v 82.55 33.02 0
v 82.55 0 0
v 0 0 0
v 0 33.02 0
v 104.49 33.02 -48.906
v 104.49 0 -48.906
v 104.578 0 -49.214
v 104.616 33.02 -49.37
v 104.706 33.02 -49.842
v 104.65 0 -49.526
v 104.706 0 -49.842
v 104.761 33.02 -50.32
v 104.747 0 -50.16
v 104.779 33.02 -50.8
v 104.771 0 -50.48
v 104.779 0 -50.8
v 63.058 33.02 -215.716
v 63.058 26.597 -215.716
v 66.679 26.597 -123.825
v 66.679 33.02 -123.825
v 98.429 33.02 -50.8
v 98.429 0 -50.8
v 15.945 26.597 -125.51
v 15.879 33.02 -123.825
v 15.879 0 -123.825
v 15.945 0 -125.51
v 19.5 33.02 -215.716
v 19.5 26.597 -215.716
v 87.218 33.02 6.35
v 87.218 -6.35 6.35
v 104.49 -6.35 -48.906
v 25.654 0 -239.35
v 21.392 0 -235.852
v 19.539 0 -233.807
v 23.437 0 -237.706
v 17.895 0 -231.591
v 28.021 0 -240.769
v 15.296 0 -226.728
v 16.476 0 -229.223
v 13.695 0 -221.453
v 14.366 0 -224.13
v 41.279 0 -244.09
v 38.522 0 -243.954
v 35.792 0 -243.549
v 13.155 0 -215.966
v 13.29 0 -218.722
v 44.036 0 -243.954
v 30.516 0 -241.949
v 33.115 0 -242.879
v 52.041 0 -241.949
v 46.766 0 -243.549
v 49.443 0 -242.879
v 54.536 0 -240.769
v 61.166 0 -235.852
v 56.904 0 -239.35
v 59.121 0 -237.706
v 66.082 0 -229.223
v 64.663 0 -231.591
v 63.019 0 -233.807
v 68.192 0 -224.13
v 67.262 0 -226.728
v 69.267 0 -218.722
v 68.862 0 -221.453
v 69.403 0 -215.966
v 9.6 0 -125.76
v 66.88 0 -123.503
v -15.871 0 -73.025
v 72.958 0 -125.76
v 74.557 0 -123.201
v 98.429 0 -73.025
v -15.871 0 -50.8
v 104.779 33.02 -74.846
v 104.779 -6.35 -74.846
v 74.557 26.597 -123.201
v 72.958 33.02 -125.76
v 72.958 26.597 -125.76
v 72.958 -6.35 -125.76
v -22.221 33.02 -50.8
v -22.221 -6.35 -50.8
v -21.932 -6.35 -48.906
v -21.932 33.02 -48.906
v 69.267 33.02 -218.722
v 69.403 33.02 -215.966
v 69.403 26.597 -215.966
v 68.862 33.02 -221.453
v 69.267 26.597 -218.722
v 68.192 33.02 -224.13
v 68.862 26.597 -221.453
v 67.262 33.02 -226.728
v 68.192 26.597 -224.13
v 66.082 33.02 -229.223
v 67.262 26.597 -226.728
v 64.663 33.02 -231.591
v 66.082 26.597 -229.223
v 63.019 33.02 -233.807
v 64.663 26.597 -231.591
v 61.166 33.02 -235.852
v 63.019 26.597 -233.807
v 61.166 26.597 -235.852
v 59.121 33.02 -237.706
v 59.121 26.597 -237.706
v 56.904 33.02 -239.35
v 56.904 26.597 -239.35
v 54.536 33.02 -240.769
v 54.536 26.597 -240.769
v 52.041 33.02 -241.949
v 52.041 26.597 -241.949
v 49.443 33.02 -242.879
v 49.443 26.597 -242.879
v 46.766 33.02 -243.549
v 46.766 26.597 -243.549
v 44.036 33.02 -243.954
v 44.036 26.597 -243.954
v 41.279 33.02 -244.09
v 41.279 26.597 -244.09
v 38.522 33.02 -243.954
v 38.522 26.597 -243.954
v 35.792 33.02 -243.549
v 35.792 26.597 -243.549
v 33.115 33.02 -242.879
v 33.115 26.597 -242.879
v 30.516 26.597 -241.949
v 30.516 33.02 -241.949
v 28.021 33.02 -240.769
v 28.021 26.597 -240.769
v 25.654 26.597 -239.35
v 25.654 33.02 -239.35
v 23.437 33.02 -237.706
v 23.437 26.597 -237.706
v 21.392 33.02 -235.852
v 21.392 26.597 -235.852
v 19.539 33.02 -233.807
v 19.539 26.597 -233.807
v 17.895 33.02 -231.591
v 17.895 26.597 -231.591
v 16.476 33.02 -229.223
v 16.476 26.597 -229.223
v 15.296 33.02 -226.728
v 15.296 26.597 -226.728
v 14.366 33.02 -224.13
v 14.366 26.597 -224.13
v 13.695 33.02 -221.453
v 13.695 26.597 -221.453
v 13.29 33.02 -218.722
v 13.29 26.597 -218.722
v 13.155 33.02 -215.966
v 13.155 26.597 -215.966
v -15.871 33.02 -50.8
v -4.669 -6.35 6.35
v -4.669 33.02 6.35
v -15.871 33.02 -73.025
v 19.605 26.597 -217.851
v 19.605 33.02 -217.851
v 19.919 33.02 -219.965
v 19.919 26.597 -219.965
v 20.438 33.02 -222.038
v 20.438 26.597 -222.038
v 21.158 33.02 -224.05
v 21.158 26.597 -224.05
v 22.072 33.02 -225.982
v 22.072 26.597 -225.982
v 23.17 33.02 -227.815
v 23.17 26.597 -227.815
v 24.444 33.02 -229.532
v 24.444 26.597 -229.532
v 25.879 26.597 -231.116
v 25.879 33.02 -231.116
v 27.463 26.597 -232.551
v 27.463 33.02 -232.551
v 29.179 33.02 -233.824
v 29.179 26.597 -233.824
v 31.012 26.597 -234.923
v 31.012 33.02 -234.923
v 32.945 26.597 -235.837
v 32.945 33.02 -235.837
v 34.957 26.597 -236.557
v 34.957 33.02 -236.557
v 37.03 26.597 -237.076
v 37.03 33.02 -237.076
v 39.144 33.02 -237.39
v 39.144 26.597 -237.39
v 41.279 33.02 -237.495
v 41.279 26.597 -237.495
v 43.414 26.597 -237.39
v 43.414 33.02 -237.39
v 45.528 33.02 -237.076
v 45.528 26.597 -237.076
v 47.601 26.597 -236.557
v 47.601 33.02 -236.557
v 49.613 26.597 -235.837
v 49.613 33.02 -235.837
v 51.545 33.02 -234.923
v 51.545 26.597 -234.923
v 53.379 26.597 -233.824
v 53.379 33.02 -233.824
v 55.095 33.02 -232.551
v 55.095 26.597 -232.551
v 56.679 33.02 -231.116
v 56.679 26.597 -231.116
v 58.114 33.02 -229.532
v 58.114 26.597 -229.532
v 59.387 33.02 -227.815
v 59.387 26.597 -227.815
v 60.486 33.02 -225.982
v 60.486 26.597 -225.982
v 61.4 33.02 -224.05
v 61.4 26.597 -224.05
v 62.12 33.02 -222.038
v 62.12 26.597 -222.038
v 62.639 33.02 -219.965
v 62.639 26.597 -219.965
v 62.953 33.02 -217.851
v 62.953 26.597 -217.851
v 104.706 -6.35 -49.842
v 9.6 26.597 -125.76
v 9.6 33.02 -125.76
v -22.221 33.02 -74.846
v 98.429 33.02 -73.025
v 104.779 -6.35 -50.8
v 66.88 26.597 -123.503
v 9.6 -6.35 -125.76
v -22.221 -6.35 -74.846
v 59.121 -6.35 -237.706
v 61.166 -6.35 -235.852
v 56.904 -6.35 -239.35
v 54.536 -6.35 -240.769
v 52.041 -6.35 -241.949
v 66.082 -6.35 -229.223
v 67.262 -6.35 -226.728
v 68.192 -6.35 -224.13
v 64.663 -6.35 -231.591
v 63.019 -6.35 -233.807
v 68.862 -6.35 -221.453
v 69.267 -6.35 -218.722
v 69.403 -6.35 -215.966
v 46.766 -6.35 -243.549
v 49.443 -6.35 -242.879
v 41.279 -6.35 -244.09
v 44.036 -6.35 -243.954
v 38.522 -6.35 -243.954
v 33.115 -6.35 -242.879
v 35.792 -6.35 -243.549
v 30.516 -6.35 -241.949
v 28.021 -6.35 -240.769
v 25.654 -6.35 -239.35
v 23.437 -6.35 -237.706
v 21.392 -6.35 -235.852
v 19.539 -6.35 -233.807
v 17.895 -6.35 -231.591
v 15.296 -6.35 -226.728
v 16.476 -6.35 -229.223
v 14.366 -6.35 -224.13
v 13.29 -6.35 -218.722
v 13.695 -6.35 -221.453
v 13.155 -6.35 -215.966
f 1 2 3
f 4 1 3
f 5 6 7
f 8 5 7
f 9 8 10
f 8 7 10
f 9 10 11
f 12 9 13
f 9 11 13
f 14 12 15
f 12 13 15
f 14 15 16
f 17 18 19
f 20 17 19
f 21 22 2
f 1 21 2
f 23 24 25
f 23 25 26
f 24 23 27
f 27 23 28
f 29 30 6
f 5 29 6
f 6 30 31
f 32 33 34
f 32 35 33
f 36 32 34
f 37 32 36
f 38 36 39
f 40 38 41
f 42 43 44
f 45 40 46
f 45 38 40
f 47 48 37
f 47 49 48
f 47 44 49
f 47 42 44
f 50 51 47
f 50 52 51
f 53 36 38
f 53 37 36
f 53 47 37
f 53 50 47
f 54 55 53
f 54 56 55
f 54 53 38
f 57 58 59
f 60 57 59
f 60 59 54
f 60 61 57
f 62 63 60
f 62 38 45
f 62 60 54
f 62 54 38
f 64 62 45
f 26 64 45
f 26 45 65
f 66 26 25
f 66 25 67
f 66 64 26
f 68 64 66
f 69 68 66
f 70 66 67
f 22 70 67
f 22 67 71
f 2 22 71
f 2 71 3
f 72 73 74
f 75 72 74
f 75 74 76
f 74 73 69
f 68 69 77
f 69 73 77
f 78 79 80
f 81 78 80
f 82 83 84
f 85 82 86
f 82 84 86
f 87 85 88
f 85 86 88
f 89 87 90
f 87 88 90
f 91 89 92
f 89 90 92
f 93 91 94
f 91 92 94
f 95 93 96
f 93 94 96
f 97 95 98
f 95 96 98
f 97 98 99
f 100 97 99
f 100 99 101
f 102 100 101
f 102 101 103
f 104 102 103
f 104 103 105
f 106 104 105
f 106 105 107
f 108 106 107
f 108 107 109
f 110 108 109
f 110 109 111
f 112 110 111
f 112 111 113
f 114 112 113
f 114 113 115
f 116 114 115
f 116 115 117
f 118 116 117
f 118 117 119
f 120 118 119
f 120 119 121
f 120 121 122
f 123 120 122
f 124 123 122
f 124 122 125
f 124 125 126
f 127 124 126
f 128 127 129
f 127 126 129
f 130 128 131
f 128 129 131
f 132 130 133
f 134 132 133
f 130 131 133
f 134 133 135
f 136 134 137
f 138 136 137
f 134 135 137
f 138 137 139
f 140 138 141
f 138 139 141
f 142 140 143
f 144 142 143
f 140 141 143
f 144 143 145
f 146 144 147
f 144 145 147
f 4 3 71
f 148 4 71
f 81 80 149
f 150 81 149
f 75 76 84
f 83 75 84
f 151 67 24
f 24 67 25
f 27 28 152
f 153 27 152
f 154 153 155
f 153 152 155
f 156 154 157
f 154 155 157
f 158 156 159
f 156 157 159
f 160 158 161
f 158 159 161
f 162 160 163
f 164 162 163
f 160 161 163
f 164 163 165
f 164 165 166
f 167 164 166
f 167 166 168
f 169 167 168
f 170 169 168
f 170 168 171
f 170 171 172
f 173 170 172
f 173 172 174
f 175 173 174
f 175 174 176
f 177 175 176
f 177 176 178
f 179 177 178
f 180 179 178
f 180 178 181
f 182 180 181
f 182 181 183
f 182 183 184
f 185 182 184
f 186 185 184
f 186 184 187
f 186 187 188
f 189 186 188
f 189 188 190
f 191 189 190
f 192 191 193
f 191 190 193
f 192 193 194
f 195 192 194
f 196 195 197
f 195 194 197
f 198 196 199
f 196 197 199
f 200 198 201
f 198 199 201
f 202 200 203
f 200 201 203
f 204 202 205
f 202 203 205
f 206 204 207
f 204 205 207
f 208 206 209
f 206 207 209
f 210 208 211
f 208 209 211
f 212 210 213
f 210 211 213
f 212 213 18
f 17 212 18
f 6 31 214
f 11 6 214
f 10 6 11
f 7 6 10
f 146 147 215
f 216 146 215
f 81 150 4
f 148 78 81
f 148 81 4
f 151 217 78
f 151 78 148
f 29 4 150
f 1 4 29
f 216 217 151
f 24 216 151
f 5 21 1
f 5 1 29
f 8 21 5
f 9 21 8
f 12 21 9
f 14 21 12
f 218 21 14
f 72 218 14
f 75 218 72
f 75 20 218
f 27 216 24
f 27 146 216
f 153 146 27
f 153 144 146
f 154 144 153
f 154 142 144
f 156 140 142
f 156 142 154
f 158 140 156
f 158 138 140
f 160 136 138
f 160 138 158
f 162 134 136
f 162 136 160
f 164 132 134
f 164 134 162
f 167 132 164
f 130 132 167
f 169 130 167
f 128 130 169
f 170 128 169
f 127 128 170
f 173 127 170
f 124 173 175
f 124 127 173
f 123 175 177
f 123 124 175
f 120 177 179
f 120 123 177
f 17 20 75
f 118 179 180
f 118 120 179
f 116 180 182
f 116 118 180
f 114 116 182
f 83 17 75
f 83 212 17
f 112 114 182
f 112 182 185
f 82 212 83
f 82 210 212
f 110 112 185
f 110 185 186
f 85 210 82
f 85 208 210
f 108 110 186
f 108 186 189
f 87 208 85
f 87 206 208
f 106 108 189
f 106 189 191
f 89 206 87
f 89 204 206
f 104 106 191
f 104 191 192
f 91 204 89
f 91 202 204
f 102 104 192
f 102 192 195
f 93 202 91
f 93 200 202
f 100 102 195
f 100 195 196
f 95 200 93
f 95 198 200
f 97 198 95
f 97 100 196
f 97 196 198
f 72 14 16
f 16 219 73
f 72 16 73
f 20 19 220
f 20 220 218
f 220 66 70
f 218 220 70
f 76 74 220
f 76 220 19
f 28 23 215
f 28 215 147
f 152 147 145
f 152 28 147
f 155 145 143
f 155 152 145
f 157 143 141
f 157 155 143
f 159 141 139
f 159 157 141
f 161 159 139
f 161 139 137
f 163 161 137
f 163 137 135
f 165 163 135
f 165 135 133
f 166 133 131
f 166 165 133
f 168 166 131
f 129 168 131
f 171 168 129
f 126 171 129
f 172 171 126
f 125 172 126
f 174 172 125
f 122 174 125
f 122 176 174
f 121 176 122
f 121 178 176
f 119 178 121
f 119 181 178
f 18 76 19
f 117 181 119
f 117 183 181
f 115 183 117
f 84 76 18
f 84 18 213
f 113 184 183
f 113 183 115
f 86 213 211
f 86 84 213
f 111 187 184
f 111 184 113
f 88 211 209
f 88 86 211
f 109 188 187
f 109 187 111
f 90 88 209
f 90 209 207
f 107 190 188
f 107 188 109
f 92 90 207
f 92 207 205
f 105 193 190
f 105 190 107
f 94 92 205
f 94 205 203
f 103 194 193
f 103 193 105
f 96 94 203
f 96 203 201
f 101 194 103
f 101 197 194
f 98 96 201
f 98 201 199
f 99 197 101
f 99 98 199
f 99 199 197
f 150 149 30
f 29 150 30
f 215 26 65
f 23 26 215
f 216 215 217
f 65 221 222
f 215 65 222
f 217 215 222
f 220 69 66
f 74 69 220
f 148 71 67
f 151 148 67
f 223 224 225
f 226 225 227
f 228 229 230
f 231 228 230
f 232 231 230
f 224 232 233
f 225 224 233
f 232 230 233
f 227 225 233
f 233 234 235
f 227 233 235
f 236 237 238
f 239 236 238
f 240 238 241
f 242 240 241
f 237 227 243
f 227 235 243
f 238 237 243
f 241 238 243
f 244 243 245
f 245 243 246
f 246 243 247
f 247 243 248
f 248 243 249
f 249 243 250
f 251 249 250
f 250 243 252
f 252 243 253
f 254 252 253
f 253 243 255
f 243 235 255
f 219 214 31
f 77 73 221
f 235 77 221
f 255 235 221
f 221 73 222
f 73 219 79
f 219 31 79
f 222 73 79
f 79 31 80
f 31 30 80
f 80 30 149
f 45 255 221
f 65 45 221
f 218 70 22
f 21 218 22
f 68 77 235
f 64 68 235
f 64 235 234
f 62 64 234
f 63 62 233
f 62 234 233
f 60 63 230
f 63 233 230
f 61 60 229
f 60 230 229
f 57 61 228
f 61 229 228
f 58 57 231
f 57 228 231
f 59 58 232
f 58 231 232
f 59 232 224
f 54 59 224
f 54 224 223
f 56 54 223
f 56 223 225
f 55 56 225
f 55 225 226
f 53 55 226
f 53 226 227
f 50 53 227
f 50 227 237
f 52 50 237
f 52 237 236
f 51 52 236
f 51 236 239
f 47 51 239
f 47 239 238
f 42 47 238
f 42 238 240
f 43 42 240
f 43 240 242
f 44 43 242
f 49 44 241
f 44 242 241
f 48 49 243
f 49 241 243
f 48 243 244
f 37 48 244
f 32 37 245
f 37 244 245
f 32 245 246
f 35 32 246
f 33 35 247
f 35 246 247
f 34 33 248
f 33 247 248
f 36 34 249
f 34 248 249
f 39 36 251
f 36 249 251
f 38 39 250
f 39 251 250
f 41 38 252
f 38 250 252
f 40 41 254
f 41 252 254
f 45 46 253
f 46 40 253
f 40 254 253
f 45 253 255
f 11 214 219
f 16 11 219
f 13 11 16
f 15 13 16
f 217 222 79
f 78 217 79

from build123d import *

# Parameters (mm, degrees)
BOSS_EXTRUDE1_DEPTH     = 33.02
BOSS_EXTRUDE2_START     = 6.35
BOSS_EXTRUDE2_DEPTH     = 6.35
CUT_EXTRUDE1_DEPTH      = 96.52
CUT_EXTRUDE1_DEPTH_BACK = 96.52
SKETCH3_W               = 138.649472244
SKETCH3_H               = 26.596699


with BuildPart() as part:
    # Sketch1 → Boss-Extrude1 (new body)
    with BuildSketch(Plane(origin=(0, 0, 0), x_dir=(1, 0, 0), z_dir=(0, 1, 0))):
        with BuildLine():
            Line((-22.221083262, 74.846156038), (-22.221083262, 50.8))
            Line((-22.221083262, 50.8), (-21.932164151, 48.906379538))
            Line((-21.932164151, 48.906379538), (-4.668805876, -6.35))
            Line((-4.668805876, -6.35), (87.218118757, -6.35))
            Line((87.218118757, -6.35), (104.489731546, 48.905528077))
            ThreePointArc((104.489731546, 48.905528077), (104.706204131, 49.841791784), (104.778916738, 50.8))
            Line((104.778916738, 50.8), (104.778916738, 74.846156038))
            Line((104.778916738, 74.846156038), (72.957581245, 125.760292827))
            Line((72.957581245, 125.760292827), (69.402851201, 215.965853579))
            ThreePointArc((69.402851201, 215.965853579), (41.278916738, 244.089788041), (13.154982275, 215.965853579))
            Line((13.154982275, 215.965853579), (9.600252232, 125.760292827))
            Line((9.600252232, 125.760292827), (-22.221083262, 74.846156038))
        make_face()
        with BuildLine():
            Line((82.55, 0), (0, 0))
            Line((0, 0), (-15.871083262, 50.8))
            Line((-15.871083262, 50.8), (-15.871083262, 73.025))
            Line((-15.871083262, 73.025), (15.878916738, 123.825))
            Line((15.878916738, 123.825), (19.500057517, 215.715813233))
            ThreePointArc((19.500057517, 215.715813233), (41.278916738, 237.494672454), (63.057775959, 215.715813233))
            Line((63.057775959, 215.715813233), (66.678916738, 123.825))
            Line((66.678916738, 123.825), (98.428916738, 73.025))
            Line((98.428916738, 73.025), (98.428916738, 50.8))
            Line((98.428916738, 50.8), (82.55, 0))
        make_face(mode=Mode.SUBTRACT)
    extrude(amount=BOSS_EXTRUDE1_DEPTH)

    # Sketch2 → Boss-Extrude2 (add)
    with BuildSketch(Plane.XZ.offset(BOSS_EXTRUDE2_START)):
        with BuildLine():
            Line((87.218118757, 6.35), (-4.668805876, 6.35))
            Line((-4.668805876, 6.35), (-21.932164151, -48.906379538))
            Line((-21.932164151, -48.906379538), (-22.221083262, -50.8))
            Line((-22.221083262, -50.8), (-22.221083262, -74.846156038))
            Line((-22.221083262, -74.846156038), (9.600252232, -125.760292827))
            Line((9.600252232, -125.760292827), (13.154982275, -215.965853579))
            ThreePointArc((13.154982275, -215.965853579), (41.278916738, -244.089788041), (69.402851201, -215.965853579))
            Line((69.402851201, -215.965853579), (72.957581245, -125.760292827))
            Line((72.957581245, -125.760292827), (104.778916738, -74.846156038))
            Line((104.778916738, -74.846156038), (104.778916738, -50.8))
            Line((104.778916738, -50.8), (104.706204131, -49.841791784))
            Line((104.706204131, -49.841791784), (104.489731546, -48.905528077))
            Line((104.489731546, -48.905528077), (87.218118757, 6.35))
        make_face()
    extrude(amount=-BOSS_EXTRUDE2_DEPTH)

    # Sketch3 → Cut-Extrude1 (cut, two sides: drawn at the far end of the back side and taken through both)
    with BuildSketch(Plane(origin=(4.637215869, 0, 0.182738741), x_dir=(-0.03937643239096595, 0, 0.9992244475452748), z_dir=(-0.9992244475452748, 0, -0.03937643239096595)).offset(-CUT_EXTRUDE1_DEPTH_BACK)):
        with Locations((-195.365518928, 13.2983495)):
            Rectangle(SKETCH3_W, SKETCH3_H)
    extrude(amount=CUT_EXTRUDE1_DEPTH + CUT_EXTRUDE1_DEPTH_BACK, mode=Mode.SUBTRACT)


solid = part.part
